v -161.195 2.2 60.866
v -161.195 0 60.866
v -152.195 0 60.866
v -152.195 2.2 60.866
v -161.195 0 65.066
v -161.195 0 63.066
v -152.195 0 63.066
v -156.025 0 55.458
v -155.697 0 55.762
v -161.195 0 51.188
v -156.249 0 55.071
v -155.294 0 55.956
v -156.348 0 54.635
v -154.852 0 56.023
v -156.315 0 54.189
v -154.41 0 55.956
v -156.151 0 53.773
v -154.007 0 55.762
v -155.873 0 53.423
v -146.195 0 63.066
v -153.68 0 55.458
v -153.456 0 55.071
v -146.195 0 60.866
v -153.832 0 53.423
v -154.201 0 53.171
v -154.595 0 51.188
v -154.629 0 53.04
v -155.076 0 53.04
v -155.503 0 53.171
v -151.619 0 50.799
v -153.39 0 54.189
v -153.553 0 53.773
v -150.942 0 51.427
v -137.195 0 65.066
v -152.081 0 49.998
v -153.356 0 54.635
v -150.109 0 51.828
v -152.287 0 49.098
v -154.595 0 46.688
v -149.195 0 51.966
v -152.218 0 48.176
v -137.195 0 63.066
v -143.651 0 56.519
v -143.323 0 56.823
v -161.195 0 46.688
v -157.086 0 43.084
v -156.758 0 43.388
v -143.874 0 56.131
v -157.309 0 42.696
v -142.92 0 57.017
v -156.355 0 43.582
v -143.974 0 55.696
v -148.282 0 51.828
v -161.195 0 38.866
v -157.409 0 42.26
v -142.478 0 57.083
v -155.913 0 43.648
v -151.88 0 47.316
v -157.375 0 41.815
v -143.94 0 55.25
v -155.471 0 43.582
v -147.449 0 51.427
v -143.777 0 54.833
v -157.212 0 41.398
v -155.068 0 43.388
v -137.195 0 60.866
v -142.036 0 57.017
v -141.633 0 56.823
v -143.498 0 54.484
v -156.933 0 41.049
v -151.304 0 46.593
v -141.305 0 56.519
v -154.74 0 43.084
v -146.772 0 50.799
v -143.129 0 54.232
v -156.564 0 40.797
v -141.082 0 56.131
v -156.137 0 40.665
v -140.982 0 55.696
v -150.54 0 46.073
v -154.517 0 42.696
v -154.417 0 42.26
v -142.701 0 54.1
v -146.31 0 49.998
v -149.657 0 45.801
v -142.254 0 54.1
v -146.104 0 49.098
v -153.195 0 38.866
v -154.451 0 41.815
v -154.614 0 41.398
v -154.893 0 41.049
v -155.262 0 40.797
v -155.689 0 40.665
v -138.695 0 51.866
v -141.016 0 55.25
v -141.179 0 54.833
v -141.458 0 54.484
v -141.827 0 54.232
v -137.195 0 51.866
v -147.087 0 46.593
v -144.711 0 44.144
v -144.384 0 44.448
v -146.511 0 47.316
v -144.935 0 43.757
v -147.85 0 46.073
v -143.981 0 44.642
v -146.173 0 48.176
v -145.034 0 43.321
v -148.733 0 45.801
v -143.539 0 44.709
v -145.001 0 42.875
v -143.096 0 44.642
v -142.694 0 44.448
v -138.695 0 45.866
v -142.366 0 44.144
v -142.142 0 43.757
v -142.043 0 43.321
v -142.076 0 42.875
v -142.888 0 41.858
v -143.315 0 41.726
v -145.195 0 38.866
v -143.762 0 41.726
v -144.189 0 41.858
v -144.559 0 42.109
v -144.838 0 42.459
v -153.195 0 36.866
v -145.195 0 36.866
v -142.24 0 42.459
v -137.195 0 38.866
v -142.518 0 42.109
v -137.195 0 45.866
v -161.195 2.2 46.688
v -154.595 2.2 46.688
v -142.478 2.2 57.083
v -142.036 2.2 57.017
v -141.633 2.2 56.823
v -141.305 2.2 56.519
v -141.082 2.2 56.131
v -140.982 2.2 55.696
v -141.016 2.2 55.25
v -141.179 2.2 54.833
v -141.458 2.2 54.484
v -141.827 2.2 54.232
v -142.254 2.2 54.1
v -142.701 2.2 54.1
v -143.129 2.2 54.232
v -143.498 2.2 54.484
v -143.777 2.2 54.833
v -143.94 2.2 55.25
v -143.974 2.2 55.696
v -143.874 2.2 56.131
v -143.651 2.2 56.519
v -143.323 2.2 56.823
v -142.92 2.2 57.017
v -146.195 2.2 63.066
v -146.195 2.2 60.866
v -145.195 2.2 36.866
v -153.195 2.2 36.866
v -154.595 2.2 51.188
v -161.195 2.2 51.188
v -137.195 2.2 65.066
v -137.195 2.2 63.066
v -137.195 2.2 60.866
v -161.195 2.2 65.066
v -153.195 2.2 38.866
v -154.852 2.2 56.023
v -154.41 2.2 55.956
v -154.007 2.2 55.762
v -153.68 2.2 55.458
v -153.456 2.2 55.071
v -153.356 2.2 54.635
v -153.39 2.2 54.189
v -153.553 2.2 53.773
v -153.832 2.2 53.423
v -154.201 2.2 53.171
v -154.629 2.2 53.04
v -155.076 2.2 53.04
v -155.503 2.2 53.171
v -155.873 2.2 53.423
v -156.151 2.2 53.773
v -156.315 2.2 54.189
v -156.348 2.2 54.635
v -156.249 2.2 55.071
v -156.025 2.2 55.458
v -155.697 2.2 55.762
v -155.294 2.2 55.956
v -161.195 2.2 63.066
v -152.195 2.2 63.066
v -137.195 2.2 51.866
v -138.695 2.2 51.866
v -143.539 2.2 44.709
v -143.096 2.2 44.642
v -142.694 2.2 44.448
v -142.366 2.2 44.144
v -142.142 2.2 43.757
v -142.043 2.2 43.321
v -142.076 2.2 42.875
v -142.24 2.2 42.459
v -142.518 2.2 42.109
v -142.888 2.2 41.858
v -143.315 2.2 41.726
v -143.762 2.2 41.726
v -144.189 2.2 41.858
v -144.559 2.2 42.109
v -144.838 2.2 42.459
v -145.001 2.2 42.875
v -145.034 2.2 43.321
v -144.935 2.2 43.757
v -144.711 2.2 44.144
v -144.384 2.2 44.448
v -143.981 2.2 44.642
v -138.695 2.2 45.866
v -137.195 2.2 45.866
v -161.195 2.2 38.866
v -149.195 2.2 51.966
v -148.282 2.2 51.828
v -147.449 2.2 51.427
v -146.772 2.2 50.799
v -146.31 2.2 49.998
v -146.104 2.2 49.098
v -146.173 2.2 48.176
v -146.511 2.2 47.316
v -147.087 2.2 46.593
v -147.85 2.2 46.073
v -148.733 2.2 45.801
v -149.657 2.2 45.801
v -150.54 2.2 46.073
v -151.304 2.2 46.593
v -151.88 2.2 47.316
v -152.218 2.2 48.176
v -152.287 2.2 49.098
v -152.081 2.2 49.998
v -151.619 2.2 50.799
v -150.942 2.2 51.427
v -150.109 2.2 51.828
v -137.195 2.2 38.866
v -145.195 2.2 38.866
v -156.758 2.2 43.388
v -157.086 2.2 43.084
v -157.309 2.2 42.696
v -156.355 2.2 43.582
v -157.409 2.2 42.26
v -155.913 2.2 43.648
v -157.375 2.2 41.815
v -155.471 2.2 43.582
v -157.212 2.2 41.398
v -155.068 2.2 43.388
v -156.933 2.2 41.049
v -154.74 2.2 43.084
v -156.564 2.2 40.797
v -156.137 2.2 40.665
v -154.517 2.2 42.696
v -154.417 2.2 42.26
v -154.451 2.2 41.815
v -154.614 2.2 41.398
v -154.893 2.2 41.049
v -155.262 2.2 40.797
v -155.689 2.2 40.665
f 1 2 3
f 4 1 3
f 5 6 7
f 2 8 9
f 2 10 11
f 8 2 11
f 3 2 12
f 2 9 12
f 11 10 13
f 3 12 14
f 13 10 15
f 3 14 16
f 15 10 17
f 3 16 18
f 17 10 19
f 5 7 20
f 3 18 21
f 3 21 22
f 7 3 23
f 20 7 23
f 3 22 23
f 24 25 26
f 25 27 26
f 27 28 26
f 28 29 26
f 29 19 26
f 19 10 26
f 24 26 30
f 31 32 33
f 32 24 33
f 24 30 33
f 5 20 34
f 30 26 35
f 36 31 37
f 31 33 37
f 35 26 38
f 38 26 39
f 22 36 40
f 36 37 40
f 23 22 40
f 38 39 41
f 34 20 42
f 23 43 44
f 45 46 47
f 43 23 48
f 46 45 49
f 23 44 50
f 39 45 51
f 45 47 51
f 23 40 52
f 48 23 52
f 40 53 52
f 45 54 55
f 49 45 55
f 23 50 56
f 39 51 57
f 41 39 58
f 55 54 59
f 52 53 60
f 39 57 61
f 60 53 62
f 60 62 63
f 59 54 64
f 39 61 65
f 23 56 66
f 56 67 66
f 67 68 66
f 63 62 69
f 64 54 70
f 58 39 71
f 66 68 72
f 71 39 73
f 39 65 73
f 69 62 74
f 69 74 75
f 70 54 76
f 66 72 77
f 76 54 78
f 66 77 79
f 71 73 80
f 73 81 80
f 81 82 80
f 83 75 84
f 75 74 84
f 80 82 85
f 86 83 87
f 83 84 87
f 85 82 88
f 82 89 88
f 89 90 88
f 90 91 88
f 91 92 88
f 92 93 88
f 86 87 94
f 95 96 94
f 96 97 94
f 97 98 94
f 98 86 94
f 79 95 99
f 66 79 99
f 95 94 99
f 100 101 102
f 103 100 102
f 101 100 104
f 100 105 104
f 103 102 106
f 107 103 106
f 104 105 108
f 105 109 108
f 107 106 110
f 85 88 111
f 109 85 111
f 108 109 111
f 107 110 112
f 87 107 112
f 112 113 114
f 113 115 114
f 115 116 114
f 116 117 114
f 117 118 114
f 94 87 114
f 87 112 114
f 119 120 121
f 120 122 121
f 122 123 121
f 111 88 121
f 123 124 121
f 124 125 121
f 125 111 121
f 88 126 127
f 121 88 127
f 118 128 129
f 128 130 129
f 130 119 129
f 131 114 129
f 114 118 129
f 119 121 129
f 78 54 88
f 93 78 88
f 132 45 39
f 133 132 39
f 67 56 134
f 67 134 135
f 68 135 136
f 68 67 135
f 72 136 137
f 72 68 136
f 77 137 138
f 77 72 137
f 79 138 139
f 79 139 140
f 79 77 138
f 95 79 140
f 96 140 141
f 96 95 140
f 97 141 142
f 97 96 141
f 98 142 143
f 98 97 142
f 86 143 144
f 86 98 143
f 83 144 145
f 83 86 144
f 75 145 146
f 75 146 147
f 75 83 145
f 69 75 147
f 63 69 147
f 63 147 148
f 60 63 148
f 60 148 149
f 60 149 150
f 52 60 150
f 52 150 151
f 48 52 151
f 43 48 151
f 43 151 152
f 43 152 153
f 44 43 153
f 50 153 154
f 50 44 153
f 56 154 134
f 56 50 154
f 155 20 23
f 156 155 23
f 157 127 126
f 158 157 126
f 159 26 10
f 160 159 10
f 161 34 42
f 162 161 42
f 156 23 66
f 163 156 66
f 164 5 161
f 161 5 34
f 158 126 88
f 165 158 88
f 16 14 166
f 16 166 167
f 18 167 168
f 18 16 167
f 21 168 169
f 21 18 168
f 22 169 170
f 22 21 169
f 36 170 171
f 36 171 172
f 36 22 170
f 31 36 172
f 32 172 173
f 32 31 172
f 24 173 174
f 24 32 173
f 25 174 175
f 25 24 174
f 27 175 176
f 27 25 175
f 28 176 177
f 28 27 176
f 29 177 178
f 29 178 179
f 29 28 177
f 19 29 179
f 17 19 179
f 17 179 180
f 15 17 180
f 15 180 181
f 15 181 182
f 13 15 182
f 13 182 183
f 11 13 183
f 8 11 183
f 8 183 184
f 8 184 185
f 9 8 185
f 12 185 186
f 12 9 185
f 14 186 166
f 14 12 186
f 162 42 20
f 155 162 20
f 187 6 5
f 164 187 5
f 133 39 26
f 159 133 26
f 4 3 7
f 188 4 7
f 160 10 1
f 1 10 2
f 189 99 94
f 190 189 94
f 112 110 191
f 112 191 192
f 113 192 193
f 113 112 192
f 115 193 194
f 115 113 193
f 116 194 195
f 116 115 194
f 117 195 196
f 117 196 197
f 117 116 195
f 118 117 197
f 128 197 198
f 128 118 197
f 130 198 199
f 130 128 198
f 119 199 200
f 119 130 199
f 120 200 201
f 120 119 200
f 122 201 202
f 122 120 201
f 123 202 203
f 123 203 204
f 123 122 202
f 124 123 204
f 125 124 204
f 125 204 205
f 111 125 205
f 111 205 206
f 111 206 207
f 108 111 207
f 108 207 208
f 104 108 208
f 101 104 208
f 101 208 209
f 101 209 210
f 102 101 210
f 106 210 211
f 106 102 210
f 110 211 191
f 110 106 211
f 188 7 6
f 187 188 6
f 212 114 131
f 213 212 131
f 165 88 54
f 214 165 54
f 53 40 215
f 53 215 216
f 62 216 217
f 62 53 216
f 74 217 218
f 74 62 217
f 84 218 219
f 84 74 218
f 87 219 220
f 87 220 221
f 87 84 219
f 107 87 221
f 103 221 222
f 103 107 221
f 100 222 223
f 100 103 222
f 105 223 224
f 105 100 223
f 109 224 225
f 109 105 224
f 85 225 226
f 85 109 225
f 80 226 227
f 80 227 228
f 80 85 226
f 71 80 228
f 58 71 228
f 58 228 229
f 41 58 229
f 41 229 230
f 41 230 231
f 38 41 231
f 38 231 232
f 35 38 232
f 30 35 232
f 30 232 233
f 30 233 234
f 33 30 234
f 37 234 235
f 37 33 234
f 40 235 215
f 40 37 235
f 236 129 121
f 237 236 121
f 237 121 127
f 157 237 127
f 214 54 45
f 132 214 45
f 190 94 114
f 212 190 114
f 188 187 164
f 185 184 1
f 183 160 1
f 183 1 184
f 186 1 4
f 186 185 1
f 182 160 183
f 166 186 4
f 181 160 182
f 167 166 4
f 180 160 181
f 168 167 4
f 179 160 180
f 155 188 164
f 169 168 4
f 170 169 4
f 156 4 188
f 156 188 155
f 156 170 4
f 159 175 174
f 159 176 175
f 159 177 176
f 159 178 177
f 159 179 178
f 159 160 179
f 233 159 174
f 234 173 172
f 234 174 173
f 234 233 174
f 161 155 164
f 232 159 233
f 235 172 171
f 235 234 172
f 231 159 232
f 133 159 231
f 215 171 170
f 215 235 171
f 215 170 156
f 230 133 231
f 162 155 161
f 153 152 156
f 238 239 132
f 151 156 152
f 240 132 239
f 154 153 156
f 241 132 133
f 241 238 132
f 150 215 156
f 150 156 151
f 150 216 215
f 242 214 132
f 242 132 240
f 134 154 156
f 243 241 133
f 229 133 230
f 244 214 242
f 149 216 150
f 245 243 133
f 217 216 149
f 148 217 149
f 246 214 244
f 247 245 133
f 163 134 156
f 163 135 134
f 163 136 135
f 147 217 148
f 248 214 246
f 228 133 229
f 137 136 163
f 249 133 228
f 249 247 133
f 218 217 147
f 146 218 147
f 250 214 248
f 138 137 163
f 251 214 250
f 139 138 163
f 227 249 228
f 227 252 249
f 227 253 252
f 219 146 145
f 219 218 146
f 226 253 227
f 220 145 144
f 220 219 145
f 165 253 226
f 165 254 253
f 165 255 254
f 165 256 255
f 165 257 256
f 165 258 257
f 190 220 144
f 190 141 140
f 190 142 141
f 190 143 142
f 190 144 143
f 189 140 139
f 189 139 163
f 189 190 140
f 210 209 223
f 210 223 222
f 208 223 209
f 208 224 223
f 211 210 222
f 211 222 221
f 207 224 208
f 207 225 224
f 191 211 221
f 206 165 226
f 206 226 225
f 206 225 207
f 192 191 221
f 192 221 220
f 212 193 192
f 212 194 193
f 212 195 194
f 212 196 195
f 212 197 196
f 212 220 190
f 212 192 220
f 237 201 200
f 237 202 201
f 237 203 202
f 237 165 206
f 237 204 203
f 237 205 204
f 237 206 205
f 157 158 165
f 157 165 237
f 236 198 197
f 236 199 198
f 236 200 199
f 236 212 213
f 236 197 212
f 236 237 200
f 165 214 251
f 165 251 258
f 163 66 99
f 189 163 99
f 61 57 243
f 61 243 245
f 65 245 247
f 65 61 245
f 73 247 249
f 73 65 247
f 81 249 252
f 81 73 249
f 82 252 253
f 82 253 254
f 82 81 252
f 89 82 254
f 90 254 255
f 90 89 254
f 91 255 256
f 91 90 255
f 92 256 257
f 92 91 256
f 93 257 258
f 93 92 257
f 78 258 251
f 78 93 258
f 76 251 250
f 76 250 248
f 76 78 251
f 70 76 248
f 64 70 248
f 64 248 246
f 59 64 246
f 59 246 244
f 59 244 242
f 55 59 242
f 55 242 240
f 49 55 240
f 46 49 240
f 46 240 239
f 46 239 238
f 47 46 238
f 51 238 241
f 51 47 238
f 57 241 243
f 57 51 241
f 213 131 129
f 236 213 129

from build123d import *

# Parameters (mm, degrees)
SKETCH1_R           = 1.5
SKETCH1_R_2         = 3.1
BOSS_EXTRUDE1_DEPTH = 2.2


with BuildPart() as part:
    # Sketch1 → Boss-Extrude1 (new body)
    with BuildSketch(Plane(origin=(0, 0, 0), x_dir=(1, 0, 0), z_dir=(0, 1, 0))):
        Polygon((-145.195425431, -36.865904239), (-153.195425431, -36.865904239), (-153.195425431, -38.865904239), (-161.195425431, -38.865904239), (-161.195425431, -46.687876258), (-154.595425431, -46.687876258), (-154.595425431, -51.187876258), (-161.195425431, -51.187876258), (-161.195425431, -60.865904239), (-152.195425431, -60.865904239), (-152.195425431, -63.065904239), (-161.195425431, -63.065904239), (-161.195425431, -65.065904239), (-137.195425431, -65.065904239), (-137.195425431, -63.065904239), (-146.195425431, -63.065904239), (-146.195425431, -60.865904239), (-137.195425431, -60.865904239), (-137.195425431, -58.865904239), (-137.195425431, -51.865904239), (-138.695425431, -51.865904239), (-138.695425431, -45.865904239), (-137.195425431, -45.865904239), (-137.195425431, -38.865904239), (-145.195425431, -38.865904239), align=None)
        with Locations(Location((-154.852279681, -54.522758488, 0), (0, 0, 270))):
            Circle(SKETCH1_R, mode=Mode.SUBTRACT)
        with Locations(Location((-142.47791101, -55.58341866, 0), (0, 0, 270))):
            Circle(SKETCH1_R, mode=Mode.SUBTRACT)
        with Locations(Location((-149.195425431, -48.865904239, 0), (0, 0, 270))):
            Circle(SKETCH1_R_2, mode=Mode.SUBTRACT)
        with Locations(Location((-155.912939853, -42.148389817, 0), (0, 0, 270))):
            Circle(SKETCH1_R, mode=Mode.SUBTRACT)
        with Locations(Location((-143.538571182, -43.209049989, 0), (0, 0, 270))):
            Circle(SKETCH1_R, mode=Mode.SUBTRACT)
    extrude(amount=BOSS_EXTRUDE1_DEPTH)


solid = part.part
